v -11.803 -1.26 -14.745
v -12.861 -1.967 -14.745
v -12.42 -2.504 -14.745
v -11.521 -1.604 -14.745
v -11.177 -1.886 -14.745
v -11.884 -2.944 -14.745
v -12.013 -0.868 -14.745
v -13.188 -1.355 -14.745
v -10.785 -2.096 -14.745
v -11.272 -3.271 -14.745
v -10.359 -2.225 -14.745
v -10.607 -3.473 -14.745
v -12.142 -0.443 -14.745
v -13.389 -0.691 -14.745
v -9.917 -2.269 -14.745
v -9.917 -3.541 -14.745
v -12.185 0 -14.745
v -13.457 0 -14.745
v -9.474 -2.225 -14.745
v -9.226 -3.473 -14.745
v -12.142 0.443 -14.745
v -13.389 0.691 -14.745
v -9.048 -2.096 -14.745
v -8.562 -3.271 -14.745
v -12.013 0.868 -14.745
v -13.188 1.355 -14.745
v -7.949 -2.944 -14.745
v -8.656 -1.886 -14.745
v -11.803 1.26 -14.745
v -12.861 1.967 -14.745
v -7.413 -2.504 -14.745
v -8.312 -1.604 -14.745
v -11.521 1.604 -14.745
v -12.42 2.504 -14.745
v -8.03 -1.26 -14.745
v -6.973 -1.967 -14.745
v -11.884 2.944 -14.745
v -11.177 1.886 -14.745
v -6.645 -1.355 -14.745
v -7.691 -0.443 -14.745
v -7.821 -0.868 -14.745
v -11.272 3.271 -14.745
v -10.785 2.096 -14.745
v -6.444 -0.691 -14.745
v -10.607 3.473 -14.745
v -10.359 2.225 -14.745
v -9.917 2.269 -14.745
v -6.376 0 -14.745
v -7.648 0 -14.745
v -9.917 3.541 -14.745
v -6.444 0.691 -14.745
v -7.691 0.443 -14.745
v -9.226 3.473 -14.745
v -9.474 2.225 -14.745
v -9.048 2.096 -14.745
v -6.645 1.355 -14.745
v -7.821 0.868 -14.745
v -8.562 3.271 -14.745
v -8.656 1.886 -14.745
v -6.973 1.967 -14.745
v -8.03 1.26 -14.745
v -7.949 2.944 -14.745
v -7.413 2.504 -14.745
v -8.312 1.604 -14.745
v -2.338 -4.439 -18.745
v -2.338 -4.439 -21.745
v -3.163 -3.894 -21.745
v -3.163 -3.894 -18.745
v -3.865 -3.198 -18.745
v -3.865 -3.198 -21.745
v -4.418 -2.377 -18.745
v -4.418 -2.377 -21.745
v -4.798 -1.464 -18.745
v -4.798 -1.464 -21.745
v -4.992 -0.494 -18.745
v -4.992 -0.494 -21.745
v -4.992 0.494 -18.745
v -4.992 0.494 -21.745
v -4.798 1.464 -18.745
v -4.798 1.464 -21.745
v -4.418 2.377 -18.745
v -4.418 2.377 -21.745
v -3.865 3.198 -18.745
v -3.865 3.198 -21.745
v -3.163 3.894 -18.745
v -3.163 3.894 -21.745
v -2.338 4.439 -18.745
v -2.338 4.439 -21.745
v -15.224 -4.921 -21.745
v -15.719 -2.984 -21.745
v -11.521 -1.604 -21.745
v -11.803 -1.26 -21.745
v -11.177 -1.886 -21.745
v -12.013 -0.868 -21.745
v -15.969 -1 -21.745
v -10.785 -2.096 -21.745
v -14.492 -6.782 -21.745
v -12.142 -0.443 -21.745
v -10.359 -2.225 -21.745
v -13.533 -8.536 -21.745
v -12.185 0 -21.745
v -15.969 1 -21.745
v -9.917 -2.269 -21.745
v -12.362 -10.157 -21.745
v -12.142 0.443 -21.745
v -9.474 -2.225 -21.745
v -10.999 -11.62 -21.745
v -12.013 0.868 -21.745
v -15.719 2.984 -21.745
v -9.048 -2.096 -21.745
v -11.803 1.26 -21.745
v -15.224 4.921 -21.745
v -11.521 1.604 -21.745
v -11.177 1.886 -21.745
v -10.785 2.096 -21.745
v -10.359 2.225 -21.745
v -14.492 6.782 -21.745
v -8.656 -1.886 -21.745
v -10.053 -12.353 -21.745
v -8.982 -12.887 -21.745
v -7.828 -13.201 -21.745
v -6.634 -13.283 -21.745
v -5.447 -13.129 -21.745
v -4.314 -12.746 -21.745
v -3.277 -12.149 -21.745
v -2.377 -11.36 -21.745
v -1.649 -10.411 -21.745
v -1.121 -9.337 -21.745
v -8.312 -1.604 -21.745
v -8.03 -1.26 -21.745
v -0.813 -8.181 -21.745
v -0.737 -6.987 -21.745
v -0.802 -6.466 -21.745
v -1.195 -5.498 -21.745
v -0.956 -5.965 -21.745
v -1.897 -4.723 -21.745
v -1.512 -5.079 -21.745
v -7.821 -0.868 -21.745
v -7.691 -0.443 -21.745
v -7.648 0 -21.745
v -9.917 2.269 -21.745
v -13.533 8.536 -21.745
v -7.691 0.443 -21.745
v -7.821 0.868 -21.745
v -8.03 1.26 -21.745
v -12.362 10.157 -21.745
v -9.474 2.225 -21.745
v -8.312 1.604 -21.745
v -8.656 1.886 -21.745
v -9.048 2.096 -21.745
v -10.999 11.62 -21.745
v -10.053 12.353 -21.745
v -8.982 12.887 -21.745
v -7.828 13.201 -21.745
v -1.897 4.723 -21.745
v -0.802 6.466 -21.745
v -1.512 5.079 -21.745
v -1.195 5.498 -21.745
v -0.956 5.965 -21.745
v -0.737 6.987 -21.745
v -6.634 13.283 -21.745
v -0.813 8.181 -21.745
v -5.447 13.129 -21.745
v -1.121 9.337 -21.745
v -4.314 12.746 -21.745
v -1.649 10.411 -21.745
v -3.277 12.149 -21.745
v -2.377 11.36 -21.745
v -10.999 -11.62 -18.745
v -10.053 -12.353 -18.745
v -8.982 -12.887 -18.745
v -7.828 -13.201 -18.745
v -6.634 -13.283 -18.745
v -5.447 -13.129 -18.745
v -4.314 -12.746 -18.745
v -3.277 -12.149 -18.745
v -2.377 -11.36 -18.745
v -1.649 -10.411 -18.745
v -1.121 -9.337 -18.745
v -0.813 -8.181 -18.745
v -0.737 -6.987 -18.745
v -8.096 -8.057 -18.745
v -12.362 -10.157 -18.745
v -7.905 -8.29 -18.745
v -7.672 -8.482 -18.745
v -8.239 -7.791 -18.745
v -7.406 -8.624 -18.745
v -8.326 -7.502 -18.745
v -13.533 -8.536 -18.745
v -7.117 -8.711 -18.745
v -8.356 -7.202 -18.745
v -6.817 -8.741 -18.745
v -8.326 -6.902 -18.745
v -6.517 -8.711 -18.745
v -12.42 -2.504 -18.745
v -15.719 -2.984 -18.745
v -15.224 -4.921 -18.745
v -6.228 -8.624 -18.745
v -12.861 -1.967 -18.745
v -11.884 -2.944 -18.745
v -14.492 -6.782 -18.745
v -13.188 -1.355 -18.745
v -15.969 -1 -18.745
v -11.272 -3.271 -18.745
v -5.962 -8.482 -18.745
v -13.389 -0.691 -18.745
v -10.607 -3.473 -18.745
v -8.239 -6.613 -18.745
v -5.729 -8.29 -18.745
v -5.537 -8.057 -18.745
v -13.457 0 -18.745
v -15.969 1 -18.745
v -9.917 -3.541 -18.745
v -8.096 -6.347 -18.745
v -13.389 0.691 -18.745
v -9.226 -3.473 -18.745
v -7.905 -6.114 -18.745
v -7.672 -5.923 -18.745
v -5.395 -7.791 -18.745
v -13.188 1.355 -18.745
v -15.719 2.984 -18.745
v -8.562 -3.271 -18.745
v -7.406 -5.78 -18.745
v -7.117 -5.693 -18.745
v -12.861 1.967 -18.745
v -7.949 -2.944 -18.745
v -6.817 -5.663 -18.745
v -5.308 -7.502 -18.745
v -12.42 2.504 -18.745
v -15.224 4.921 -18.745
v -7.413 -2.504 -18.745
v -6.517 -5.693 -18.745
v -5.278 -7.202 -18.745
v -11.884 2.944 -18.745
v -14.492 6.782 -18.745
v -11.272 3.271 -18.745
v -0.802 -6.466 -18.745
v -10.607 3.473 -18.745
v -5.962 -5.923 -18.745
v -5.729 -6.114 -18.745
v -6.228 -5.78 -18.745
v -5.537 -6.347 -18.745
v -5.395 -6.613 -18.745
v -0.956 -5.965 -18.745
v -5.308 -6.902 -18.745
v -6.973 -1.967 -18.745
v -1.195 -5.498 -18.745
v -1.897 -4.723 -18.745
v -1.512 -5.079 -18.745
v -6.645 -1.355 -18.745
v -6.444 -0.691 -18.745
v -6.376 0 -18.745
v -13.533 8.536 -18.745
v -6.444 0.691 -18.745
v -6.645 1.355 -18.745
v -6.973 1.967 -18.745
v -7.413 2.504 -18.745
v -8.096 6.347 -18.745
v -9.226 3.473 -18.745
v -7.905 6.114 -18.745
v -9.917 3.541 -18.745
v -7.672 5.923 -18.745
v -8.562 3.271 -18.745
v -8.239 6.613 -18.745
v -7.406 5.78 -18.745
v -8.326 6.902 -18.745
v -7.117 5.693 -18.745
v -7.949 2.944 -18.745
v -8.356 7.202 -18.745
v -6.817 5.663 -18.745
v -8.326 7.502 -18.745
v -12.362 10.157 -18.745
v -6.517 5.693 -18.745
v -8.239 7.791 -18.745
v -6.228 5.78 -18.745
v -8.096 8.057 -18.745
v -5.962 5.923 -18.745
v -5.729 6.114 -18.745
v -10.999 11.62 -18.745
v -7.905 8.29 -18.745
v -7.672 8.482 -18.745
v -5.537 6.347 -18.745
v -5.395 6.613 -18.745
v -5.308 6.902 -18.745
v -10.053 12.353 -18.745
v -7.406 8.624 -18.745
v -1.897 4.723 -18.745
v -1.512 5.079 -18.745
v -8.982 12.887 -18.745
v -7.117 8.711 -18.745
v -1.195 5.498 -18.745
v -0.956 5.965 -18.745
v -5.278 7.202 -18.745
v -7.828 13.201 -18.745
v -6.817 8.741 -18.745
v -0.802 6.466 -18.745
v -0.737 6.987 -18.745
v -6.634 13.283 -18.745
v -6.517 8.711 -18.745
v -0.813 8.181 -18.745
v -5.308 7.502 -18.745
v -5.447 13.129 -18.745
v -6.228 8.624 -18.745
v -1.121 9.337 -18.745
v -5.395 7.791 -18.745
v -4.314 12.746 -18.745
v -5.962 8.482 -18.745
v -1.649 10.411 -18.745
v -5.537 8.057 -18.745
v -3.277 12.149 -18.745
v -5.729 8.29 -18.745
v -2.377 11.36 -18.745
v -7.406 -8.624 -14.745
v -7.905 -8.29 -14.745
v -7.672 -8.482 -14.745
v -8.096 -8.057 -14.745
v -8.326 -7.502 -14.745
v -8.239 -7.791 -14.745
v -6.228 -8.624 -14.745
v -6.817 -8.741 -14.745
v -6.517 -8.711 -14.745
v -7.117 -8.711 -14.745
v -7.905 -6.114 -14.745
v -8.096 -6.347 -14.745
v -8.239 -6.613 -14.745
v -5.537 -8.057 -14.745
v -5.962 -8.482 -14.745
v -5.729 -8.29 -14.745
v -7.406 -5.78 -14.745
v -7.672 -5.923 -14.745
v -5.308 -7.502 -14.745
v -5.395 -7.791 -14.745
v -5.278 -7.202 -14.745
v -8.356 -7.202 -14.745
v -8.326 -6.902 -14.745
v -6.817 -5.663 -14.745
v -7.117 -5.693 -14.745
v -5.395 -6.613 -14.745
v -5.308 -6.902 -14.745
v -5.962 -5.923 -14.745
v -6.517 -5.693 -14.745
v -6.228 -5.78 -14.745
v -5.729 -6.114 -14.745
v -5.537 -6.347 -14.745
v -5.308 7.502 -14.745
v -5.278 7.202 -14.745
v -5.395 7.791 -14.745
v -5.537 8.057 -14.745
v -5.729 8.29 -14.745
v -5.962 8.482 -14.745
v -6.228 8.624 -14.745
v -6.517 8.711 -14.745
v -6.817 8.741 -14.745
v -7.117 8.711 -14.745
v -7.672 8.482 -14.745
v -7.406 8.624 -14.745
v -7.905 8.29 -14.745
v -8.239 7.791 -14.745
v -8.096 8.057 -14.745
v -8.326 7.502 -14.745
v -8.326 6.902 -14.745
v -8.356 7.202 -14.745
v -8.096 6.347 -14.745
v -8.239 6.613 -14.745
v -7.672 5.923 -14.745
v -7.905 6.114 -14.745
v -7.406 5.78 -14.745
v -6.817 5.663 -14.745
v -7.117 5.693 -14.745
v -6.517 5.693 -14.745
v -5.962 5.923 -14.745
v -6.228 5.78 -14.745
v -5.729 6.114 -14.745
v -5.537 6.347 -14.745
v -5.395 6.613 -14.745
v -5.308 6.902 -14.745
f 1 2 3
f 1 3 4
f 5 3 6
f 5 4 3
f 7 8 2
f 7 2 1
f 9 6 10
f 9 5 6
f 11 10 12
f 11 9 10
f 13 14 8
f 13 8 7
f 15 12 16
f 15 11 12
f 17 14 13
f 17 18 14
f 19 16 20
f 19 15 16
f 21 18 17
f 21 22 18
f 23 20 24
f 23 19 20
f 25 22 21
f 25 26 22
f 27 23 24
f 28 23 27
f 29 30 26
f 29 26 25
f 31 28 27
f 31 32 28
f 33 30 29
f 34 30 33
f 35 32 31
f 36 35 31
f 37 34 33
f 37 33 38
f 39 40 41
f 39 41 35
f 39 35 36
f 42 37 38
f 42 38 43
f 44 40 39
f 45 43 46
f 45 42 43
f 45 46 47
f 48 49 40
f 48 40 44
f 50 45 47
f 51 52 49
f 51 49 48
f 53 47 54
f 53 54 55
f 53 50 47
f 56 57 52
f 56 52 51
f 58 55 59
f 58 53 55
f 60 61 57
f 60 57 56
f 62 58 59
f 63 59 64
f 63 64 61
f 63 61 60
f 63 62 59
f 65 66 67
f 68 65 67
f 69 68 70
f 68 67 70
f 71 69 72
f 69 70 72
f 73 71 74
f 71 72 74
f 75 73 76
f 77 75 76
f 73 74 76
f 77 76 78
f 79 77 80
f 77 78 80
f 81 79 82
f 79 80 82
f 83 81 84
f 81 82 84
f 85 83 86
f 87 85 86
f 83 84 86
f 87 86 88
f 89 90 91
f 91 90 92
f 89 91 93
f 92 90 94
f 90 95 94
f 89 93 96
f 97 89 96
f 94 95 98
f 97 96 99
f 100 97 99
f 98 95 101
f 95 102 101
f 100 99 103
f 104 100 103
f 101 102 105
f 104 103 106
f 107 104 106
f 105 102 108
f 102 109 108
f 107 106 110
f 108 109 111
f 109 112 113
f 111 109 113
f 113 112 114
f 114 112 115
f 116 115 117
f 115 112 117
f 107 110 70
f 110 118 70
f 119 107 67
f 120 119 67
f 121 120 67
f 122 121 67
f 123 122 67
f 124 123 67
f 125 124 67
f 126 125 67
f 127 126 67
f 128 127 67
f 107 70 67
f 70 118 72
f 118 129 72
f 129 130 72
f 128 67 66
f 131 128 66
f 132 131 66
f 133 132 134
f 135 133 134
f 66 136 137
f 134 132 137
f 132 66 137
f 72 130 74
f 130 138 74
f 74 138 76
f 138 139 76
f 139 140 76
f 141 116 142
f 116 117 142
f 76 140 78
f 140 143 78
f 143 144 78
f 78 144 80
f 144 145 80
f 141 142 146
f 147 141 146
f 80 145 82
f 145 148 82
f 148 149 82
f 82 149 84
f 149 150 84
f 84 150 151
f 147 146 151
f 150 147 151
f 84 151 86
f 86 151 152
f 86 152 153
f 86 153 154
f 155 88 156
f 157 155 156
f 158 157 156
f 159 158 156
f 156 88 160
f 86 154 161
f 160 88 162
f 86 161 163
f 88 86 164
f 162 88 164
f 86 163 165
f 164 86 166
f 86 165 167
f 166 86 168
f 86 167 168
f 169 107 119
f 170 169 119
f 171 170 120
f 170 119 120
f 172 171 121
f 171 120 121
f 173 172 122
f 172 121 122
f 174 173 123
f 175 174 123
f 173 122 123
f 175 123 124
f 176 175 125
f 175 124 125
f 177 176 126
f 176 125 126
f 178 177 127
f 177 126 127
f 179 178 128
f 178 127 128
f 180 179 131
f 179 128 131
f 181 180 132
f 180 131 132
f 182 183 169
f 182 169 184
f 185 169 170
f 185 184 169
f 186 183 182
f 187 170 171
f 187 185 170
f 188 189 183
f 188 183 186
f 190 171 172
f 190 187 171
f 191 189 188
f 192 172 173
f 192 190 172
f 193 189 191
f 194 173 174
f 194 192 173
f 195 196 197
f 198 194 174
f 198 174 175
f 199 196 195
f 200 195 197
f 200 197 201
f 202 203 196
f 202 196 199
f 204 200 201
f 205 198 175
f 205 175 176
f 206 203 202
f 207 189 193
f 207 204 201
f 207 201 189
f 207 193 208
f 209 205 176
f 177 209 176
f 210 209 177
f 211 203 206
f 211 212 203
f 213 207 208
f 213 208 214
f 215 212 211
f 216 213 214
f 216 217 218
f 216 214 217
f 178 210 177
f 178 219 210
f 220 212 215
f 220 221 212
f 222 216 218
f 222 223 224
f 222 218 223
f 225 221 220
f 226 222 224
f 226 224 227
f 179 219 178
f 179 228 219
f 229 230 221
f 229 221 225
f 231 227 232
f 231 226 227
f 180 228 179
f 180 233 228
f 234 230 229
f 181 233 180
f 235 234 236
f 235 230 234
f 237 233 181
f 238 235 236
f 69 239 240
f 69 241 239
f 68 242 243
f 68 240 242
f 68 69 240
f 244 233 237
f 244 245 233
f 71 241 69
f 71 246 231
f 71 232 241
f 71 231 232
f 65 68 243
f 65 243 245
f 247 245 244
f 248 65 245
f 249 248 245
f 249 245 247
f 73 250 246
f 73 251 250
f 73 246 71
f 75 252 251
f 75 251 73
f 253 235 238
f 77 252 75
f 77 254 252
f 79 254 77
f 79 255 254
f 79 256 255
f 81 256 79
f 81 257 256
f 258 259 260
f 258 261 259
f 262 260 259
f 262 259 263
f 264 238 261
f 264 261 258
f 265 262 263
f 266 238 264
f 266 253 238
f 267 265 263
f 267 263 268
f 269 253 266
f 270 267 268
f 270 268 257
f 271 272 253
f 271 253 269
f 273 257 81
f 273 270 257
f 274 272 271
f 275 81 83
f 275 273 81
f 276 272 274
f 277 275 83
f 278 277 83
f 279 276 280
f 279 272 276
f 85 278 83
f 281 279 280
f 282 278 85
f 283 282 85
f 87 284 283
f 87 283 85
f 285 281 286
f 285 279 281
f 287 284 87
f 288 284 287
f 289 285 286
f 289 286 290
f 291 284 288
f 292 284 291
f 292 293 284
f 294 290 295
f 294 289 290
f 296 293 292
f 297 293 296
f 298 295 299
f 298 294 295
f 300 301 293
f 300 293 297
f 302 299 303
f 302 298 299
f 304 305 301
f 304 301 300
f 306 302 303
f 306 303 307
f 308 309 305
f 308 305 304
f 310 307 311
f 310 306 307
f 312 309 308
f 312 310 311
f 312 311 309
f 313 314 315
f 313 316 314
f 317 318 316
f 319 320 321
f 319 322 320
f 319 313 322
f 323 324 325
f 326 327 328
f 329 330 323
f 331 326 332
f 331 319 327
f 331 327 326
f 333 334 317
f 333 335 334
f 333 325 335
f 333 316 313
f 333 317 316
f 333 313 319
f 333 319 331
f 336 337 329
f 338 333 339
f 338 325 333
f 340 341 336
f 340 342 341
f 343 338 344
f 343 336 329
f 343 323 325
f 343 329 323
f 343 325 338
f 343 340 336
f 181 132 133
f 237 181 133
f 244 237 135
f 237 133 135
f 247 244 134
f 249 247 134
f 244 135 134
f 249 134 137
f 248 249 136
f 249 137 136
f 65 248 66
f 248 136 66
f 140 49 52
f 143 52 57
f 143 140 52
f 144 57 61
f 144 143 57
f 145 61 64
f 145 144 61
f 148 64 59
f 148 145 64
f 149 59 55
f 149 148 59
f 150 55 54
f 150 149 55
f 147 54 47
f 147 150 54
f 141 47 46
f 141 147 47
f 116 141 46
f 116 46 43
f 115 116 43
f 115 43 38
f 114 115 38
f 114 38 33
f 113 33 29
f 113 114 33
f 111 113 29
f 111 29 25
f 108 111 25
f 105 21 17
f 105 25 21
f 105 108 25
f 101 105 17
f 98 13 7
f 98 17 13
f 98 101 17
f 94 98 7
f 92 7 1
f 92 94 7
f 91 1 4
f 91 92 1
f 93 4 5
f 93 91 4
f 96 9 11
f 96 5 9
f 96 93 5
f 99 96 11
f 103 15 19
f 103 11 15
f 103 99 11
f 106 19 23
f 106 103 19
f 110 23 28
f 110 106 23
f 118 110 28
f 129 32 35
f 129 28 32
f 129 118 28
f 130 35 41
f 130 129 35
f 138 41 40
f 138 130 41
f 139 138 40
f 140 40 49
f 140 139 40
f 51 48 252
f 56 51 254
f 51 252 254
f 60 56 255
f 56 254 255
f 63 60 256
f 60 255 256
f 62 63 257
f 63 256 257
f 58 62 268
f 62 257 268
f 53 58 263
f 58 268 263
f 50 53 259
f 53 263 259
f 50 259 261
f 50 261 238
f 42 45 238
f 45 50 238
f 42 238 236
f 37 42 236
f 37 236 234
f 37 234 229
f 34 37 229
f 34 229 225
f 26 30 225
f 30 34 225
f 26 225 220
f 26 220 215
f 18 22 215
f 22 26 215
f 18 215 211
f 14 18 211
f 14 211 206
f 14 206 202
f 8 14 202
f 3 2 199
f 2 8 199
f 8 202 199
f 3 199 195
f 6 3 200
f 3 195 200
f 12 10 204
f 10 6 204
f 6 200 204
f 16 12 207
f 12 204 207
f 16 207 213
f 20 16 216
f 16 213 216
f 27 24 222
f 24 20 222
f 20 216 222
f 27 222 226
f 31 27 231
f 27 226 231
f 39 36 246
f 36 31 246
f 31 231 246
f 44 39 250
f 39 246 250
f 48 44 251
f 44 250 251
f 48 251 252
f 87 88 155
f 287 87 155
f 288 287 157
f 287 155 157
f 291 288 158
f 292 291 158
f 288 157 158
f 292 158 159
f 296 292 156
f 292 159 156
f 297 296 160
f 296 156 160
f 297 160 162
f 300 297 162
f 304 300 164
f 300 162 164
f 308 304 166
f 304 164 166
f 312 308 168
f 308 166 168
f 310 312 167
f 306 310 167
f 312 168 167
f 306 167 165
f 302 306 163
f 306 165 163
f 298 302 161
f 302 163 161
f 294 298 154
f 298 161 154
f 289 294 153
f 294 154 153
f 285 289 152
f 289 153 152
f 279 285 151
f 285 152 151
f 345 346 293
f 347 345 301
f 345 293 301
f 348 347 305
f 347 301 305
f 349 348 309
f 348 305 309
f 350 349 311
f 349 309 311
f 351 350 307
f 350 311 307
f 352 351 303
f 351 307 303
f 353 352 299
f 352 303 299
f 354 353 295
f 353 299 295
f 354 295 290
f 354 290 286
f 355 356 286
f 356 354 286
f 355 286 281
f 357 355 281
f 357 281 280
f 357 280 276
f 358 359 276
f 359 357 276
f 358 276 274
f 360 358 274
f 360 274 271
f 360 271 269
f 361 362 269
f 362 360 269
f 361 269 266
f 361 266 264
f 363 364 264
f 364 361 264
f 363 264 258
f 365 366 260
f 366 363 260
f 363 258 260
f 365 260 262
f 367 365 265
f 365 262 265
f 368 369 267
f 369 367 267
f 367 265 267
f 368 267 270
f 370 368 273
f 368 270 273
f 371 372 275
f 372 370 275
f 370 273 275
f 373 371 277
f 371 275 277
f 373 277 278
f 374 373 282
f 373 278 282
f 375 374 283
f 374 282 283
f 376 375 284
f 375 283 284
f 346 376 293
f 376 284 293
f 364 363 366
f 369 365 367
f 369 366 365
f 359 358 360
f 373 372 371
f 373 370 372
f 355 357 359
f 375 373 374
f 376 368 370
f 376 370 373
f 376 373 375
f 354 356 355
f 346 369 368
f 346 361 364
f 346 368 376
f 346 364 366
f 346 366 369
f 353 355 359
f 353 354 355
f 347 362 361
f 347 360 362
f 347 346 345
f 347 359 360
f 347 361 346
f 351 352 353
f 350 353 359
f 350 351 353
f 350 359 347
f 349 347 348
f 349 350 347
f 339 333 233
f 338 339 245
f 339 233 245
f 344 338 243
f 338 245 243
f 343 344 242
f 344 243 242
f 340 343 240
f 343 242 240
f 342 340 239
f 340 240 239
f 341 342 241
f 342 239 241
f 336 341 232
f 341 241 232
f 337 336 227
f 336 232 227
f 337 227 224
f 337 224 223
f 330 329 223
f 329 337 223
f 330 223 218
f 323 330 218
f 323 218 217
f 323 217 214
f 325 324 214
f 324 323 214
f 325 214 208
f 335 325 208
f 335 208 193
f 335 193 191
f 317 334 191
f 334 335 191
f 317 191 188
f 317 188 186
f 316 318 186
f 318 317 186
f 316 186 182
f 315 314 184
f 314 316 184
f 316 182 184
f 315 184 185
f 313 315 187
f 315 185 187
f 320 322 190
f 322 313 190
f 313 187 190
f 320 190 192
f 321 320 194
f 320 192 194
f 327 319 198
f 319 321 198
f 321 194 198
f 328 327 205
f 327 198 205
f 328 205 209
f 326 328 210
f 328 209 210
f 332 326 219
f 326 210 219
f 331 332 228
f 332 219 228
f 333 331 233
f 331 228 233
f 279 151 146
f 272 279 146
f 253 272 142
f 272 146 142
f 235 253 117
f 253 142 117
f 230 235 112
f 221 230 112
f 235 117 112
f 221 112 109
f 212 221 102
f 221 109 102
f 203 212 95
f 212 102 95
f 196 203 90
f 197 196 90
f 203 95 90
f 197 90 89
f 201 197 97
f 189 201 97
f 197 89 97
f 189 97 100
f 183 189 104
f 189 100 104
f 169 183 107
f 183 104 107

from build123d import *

# Parameters (mm, degrees)
PART2_1_START         = -21.745
PART2_1_OUTLINE_R     = 2.268804718
PART2_1_DEPTH         = 3
PART2_1_START_2       = -18.745
PART2_1_2_OUTLINE_R   = 1.538851722
PART2_1_2_OUTLINE_R_2 = 3.540835997
PART2_1_2_OUTLINE_R_3 = 2.268804718
PART2_1_2_DEPTH       = 5
SKETCH_1_W            = 9.919146705
SKETCH_1_H            = 22.592426062
CUT_EXTRUDE_1_DEPTH   = 1


# Read off the part's stored shape, not the designer's step: 基体零件-part2-1
with BuildPart() as part:
    # 基体零件-part2-1 outline → 基体零件-part2-1 (new body)
    with BuildSketch(Plane.XY.offset(PART2_1_START)):
        with BuildLine():
            ThreePointArc((-0.73742282, -6.986834522), (-1.194921758, -5.497574164), (-2.33759914, -4.438569872))
            ThreePointArc((-2.33759914, -4.438569872), (-5.0165, 0), (-2.33759914, 4.438569872))
            ThreePointArc((-2.33759914, 4.438569872), (-1.194921758, 5.497574164), (-0.73742282, 6.986834522))
            ThreePointArc((-0.73742282, 6.986834522), (-4.313555127, 12.746389448), (-10.998808821, 11.620077647))
            ThreePointArc((-10.998808821, 11.620077647), (-16, 0), (-10.998808821, -11.620077647))
            ThreePointArc((-10.998808821, -11.620077647), (-4.313555127, -12.746389448), (-0.73742282, -6.986834522))
        make_face()
        with Locations((-9.916654285, 0)):
            Circle(PART2_1_OUTLINE_R, mode=Mode.SUBTRACT)
    extrude(amount=PART2_1_DEPTH)

    # part2-1 2 outline → part2-1 2 (add)
    # profile 1 of 3: a face of its own
    with BuildSketch(Plane.XY.offset(PART2_1_START_2)):
        with Locations((-6.816961539, -7.2020183)):
            Circle(PART2_1_2_OUTLINE_R)
    # profile 2 of 3: a face of its own
    with BuildSketch(Plane.XY.offset(PART2_1_START_2)):
        with Locations((-9.916654285, 0)):
            Circle(PART2_1_2_OUTLINE_R_2)
        with Locations((-9.916654285, 0)):
            Circle(PART2_1_2_OUTLINE_R_3, mode=Mode.SUBTRACT)
    # profile 3 of 3: a face of its own
    with BuildSketch(Plane.XY.offset(PART2_1_START_2)):
        with Locations((-6.816961539, 7.2020183)):
            Circle(PART2_1_2_OUTLINE_R)
    extrude(amount=PART2_1_2_DEPTH)

    # 草图1 → 切除-拉伸1 (cut)
    with BuildSketch(Plane.XY.offset(-13.745)):
        with Locations((-9.361869936, 0)):
            Rectangle(SKETCH_1_W, SKETCH_1_H)
    extrude(amount=-CUT_EXTRUDE_1_DEPTH, mode=Mode.SUBTRACT)


solid = part.part
